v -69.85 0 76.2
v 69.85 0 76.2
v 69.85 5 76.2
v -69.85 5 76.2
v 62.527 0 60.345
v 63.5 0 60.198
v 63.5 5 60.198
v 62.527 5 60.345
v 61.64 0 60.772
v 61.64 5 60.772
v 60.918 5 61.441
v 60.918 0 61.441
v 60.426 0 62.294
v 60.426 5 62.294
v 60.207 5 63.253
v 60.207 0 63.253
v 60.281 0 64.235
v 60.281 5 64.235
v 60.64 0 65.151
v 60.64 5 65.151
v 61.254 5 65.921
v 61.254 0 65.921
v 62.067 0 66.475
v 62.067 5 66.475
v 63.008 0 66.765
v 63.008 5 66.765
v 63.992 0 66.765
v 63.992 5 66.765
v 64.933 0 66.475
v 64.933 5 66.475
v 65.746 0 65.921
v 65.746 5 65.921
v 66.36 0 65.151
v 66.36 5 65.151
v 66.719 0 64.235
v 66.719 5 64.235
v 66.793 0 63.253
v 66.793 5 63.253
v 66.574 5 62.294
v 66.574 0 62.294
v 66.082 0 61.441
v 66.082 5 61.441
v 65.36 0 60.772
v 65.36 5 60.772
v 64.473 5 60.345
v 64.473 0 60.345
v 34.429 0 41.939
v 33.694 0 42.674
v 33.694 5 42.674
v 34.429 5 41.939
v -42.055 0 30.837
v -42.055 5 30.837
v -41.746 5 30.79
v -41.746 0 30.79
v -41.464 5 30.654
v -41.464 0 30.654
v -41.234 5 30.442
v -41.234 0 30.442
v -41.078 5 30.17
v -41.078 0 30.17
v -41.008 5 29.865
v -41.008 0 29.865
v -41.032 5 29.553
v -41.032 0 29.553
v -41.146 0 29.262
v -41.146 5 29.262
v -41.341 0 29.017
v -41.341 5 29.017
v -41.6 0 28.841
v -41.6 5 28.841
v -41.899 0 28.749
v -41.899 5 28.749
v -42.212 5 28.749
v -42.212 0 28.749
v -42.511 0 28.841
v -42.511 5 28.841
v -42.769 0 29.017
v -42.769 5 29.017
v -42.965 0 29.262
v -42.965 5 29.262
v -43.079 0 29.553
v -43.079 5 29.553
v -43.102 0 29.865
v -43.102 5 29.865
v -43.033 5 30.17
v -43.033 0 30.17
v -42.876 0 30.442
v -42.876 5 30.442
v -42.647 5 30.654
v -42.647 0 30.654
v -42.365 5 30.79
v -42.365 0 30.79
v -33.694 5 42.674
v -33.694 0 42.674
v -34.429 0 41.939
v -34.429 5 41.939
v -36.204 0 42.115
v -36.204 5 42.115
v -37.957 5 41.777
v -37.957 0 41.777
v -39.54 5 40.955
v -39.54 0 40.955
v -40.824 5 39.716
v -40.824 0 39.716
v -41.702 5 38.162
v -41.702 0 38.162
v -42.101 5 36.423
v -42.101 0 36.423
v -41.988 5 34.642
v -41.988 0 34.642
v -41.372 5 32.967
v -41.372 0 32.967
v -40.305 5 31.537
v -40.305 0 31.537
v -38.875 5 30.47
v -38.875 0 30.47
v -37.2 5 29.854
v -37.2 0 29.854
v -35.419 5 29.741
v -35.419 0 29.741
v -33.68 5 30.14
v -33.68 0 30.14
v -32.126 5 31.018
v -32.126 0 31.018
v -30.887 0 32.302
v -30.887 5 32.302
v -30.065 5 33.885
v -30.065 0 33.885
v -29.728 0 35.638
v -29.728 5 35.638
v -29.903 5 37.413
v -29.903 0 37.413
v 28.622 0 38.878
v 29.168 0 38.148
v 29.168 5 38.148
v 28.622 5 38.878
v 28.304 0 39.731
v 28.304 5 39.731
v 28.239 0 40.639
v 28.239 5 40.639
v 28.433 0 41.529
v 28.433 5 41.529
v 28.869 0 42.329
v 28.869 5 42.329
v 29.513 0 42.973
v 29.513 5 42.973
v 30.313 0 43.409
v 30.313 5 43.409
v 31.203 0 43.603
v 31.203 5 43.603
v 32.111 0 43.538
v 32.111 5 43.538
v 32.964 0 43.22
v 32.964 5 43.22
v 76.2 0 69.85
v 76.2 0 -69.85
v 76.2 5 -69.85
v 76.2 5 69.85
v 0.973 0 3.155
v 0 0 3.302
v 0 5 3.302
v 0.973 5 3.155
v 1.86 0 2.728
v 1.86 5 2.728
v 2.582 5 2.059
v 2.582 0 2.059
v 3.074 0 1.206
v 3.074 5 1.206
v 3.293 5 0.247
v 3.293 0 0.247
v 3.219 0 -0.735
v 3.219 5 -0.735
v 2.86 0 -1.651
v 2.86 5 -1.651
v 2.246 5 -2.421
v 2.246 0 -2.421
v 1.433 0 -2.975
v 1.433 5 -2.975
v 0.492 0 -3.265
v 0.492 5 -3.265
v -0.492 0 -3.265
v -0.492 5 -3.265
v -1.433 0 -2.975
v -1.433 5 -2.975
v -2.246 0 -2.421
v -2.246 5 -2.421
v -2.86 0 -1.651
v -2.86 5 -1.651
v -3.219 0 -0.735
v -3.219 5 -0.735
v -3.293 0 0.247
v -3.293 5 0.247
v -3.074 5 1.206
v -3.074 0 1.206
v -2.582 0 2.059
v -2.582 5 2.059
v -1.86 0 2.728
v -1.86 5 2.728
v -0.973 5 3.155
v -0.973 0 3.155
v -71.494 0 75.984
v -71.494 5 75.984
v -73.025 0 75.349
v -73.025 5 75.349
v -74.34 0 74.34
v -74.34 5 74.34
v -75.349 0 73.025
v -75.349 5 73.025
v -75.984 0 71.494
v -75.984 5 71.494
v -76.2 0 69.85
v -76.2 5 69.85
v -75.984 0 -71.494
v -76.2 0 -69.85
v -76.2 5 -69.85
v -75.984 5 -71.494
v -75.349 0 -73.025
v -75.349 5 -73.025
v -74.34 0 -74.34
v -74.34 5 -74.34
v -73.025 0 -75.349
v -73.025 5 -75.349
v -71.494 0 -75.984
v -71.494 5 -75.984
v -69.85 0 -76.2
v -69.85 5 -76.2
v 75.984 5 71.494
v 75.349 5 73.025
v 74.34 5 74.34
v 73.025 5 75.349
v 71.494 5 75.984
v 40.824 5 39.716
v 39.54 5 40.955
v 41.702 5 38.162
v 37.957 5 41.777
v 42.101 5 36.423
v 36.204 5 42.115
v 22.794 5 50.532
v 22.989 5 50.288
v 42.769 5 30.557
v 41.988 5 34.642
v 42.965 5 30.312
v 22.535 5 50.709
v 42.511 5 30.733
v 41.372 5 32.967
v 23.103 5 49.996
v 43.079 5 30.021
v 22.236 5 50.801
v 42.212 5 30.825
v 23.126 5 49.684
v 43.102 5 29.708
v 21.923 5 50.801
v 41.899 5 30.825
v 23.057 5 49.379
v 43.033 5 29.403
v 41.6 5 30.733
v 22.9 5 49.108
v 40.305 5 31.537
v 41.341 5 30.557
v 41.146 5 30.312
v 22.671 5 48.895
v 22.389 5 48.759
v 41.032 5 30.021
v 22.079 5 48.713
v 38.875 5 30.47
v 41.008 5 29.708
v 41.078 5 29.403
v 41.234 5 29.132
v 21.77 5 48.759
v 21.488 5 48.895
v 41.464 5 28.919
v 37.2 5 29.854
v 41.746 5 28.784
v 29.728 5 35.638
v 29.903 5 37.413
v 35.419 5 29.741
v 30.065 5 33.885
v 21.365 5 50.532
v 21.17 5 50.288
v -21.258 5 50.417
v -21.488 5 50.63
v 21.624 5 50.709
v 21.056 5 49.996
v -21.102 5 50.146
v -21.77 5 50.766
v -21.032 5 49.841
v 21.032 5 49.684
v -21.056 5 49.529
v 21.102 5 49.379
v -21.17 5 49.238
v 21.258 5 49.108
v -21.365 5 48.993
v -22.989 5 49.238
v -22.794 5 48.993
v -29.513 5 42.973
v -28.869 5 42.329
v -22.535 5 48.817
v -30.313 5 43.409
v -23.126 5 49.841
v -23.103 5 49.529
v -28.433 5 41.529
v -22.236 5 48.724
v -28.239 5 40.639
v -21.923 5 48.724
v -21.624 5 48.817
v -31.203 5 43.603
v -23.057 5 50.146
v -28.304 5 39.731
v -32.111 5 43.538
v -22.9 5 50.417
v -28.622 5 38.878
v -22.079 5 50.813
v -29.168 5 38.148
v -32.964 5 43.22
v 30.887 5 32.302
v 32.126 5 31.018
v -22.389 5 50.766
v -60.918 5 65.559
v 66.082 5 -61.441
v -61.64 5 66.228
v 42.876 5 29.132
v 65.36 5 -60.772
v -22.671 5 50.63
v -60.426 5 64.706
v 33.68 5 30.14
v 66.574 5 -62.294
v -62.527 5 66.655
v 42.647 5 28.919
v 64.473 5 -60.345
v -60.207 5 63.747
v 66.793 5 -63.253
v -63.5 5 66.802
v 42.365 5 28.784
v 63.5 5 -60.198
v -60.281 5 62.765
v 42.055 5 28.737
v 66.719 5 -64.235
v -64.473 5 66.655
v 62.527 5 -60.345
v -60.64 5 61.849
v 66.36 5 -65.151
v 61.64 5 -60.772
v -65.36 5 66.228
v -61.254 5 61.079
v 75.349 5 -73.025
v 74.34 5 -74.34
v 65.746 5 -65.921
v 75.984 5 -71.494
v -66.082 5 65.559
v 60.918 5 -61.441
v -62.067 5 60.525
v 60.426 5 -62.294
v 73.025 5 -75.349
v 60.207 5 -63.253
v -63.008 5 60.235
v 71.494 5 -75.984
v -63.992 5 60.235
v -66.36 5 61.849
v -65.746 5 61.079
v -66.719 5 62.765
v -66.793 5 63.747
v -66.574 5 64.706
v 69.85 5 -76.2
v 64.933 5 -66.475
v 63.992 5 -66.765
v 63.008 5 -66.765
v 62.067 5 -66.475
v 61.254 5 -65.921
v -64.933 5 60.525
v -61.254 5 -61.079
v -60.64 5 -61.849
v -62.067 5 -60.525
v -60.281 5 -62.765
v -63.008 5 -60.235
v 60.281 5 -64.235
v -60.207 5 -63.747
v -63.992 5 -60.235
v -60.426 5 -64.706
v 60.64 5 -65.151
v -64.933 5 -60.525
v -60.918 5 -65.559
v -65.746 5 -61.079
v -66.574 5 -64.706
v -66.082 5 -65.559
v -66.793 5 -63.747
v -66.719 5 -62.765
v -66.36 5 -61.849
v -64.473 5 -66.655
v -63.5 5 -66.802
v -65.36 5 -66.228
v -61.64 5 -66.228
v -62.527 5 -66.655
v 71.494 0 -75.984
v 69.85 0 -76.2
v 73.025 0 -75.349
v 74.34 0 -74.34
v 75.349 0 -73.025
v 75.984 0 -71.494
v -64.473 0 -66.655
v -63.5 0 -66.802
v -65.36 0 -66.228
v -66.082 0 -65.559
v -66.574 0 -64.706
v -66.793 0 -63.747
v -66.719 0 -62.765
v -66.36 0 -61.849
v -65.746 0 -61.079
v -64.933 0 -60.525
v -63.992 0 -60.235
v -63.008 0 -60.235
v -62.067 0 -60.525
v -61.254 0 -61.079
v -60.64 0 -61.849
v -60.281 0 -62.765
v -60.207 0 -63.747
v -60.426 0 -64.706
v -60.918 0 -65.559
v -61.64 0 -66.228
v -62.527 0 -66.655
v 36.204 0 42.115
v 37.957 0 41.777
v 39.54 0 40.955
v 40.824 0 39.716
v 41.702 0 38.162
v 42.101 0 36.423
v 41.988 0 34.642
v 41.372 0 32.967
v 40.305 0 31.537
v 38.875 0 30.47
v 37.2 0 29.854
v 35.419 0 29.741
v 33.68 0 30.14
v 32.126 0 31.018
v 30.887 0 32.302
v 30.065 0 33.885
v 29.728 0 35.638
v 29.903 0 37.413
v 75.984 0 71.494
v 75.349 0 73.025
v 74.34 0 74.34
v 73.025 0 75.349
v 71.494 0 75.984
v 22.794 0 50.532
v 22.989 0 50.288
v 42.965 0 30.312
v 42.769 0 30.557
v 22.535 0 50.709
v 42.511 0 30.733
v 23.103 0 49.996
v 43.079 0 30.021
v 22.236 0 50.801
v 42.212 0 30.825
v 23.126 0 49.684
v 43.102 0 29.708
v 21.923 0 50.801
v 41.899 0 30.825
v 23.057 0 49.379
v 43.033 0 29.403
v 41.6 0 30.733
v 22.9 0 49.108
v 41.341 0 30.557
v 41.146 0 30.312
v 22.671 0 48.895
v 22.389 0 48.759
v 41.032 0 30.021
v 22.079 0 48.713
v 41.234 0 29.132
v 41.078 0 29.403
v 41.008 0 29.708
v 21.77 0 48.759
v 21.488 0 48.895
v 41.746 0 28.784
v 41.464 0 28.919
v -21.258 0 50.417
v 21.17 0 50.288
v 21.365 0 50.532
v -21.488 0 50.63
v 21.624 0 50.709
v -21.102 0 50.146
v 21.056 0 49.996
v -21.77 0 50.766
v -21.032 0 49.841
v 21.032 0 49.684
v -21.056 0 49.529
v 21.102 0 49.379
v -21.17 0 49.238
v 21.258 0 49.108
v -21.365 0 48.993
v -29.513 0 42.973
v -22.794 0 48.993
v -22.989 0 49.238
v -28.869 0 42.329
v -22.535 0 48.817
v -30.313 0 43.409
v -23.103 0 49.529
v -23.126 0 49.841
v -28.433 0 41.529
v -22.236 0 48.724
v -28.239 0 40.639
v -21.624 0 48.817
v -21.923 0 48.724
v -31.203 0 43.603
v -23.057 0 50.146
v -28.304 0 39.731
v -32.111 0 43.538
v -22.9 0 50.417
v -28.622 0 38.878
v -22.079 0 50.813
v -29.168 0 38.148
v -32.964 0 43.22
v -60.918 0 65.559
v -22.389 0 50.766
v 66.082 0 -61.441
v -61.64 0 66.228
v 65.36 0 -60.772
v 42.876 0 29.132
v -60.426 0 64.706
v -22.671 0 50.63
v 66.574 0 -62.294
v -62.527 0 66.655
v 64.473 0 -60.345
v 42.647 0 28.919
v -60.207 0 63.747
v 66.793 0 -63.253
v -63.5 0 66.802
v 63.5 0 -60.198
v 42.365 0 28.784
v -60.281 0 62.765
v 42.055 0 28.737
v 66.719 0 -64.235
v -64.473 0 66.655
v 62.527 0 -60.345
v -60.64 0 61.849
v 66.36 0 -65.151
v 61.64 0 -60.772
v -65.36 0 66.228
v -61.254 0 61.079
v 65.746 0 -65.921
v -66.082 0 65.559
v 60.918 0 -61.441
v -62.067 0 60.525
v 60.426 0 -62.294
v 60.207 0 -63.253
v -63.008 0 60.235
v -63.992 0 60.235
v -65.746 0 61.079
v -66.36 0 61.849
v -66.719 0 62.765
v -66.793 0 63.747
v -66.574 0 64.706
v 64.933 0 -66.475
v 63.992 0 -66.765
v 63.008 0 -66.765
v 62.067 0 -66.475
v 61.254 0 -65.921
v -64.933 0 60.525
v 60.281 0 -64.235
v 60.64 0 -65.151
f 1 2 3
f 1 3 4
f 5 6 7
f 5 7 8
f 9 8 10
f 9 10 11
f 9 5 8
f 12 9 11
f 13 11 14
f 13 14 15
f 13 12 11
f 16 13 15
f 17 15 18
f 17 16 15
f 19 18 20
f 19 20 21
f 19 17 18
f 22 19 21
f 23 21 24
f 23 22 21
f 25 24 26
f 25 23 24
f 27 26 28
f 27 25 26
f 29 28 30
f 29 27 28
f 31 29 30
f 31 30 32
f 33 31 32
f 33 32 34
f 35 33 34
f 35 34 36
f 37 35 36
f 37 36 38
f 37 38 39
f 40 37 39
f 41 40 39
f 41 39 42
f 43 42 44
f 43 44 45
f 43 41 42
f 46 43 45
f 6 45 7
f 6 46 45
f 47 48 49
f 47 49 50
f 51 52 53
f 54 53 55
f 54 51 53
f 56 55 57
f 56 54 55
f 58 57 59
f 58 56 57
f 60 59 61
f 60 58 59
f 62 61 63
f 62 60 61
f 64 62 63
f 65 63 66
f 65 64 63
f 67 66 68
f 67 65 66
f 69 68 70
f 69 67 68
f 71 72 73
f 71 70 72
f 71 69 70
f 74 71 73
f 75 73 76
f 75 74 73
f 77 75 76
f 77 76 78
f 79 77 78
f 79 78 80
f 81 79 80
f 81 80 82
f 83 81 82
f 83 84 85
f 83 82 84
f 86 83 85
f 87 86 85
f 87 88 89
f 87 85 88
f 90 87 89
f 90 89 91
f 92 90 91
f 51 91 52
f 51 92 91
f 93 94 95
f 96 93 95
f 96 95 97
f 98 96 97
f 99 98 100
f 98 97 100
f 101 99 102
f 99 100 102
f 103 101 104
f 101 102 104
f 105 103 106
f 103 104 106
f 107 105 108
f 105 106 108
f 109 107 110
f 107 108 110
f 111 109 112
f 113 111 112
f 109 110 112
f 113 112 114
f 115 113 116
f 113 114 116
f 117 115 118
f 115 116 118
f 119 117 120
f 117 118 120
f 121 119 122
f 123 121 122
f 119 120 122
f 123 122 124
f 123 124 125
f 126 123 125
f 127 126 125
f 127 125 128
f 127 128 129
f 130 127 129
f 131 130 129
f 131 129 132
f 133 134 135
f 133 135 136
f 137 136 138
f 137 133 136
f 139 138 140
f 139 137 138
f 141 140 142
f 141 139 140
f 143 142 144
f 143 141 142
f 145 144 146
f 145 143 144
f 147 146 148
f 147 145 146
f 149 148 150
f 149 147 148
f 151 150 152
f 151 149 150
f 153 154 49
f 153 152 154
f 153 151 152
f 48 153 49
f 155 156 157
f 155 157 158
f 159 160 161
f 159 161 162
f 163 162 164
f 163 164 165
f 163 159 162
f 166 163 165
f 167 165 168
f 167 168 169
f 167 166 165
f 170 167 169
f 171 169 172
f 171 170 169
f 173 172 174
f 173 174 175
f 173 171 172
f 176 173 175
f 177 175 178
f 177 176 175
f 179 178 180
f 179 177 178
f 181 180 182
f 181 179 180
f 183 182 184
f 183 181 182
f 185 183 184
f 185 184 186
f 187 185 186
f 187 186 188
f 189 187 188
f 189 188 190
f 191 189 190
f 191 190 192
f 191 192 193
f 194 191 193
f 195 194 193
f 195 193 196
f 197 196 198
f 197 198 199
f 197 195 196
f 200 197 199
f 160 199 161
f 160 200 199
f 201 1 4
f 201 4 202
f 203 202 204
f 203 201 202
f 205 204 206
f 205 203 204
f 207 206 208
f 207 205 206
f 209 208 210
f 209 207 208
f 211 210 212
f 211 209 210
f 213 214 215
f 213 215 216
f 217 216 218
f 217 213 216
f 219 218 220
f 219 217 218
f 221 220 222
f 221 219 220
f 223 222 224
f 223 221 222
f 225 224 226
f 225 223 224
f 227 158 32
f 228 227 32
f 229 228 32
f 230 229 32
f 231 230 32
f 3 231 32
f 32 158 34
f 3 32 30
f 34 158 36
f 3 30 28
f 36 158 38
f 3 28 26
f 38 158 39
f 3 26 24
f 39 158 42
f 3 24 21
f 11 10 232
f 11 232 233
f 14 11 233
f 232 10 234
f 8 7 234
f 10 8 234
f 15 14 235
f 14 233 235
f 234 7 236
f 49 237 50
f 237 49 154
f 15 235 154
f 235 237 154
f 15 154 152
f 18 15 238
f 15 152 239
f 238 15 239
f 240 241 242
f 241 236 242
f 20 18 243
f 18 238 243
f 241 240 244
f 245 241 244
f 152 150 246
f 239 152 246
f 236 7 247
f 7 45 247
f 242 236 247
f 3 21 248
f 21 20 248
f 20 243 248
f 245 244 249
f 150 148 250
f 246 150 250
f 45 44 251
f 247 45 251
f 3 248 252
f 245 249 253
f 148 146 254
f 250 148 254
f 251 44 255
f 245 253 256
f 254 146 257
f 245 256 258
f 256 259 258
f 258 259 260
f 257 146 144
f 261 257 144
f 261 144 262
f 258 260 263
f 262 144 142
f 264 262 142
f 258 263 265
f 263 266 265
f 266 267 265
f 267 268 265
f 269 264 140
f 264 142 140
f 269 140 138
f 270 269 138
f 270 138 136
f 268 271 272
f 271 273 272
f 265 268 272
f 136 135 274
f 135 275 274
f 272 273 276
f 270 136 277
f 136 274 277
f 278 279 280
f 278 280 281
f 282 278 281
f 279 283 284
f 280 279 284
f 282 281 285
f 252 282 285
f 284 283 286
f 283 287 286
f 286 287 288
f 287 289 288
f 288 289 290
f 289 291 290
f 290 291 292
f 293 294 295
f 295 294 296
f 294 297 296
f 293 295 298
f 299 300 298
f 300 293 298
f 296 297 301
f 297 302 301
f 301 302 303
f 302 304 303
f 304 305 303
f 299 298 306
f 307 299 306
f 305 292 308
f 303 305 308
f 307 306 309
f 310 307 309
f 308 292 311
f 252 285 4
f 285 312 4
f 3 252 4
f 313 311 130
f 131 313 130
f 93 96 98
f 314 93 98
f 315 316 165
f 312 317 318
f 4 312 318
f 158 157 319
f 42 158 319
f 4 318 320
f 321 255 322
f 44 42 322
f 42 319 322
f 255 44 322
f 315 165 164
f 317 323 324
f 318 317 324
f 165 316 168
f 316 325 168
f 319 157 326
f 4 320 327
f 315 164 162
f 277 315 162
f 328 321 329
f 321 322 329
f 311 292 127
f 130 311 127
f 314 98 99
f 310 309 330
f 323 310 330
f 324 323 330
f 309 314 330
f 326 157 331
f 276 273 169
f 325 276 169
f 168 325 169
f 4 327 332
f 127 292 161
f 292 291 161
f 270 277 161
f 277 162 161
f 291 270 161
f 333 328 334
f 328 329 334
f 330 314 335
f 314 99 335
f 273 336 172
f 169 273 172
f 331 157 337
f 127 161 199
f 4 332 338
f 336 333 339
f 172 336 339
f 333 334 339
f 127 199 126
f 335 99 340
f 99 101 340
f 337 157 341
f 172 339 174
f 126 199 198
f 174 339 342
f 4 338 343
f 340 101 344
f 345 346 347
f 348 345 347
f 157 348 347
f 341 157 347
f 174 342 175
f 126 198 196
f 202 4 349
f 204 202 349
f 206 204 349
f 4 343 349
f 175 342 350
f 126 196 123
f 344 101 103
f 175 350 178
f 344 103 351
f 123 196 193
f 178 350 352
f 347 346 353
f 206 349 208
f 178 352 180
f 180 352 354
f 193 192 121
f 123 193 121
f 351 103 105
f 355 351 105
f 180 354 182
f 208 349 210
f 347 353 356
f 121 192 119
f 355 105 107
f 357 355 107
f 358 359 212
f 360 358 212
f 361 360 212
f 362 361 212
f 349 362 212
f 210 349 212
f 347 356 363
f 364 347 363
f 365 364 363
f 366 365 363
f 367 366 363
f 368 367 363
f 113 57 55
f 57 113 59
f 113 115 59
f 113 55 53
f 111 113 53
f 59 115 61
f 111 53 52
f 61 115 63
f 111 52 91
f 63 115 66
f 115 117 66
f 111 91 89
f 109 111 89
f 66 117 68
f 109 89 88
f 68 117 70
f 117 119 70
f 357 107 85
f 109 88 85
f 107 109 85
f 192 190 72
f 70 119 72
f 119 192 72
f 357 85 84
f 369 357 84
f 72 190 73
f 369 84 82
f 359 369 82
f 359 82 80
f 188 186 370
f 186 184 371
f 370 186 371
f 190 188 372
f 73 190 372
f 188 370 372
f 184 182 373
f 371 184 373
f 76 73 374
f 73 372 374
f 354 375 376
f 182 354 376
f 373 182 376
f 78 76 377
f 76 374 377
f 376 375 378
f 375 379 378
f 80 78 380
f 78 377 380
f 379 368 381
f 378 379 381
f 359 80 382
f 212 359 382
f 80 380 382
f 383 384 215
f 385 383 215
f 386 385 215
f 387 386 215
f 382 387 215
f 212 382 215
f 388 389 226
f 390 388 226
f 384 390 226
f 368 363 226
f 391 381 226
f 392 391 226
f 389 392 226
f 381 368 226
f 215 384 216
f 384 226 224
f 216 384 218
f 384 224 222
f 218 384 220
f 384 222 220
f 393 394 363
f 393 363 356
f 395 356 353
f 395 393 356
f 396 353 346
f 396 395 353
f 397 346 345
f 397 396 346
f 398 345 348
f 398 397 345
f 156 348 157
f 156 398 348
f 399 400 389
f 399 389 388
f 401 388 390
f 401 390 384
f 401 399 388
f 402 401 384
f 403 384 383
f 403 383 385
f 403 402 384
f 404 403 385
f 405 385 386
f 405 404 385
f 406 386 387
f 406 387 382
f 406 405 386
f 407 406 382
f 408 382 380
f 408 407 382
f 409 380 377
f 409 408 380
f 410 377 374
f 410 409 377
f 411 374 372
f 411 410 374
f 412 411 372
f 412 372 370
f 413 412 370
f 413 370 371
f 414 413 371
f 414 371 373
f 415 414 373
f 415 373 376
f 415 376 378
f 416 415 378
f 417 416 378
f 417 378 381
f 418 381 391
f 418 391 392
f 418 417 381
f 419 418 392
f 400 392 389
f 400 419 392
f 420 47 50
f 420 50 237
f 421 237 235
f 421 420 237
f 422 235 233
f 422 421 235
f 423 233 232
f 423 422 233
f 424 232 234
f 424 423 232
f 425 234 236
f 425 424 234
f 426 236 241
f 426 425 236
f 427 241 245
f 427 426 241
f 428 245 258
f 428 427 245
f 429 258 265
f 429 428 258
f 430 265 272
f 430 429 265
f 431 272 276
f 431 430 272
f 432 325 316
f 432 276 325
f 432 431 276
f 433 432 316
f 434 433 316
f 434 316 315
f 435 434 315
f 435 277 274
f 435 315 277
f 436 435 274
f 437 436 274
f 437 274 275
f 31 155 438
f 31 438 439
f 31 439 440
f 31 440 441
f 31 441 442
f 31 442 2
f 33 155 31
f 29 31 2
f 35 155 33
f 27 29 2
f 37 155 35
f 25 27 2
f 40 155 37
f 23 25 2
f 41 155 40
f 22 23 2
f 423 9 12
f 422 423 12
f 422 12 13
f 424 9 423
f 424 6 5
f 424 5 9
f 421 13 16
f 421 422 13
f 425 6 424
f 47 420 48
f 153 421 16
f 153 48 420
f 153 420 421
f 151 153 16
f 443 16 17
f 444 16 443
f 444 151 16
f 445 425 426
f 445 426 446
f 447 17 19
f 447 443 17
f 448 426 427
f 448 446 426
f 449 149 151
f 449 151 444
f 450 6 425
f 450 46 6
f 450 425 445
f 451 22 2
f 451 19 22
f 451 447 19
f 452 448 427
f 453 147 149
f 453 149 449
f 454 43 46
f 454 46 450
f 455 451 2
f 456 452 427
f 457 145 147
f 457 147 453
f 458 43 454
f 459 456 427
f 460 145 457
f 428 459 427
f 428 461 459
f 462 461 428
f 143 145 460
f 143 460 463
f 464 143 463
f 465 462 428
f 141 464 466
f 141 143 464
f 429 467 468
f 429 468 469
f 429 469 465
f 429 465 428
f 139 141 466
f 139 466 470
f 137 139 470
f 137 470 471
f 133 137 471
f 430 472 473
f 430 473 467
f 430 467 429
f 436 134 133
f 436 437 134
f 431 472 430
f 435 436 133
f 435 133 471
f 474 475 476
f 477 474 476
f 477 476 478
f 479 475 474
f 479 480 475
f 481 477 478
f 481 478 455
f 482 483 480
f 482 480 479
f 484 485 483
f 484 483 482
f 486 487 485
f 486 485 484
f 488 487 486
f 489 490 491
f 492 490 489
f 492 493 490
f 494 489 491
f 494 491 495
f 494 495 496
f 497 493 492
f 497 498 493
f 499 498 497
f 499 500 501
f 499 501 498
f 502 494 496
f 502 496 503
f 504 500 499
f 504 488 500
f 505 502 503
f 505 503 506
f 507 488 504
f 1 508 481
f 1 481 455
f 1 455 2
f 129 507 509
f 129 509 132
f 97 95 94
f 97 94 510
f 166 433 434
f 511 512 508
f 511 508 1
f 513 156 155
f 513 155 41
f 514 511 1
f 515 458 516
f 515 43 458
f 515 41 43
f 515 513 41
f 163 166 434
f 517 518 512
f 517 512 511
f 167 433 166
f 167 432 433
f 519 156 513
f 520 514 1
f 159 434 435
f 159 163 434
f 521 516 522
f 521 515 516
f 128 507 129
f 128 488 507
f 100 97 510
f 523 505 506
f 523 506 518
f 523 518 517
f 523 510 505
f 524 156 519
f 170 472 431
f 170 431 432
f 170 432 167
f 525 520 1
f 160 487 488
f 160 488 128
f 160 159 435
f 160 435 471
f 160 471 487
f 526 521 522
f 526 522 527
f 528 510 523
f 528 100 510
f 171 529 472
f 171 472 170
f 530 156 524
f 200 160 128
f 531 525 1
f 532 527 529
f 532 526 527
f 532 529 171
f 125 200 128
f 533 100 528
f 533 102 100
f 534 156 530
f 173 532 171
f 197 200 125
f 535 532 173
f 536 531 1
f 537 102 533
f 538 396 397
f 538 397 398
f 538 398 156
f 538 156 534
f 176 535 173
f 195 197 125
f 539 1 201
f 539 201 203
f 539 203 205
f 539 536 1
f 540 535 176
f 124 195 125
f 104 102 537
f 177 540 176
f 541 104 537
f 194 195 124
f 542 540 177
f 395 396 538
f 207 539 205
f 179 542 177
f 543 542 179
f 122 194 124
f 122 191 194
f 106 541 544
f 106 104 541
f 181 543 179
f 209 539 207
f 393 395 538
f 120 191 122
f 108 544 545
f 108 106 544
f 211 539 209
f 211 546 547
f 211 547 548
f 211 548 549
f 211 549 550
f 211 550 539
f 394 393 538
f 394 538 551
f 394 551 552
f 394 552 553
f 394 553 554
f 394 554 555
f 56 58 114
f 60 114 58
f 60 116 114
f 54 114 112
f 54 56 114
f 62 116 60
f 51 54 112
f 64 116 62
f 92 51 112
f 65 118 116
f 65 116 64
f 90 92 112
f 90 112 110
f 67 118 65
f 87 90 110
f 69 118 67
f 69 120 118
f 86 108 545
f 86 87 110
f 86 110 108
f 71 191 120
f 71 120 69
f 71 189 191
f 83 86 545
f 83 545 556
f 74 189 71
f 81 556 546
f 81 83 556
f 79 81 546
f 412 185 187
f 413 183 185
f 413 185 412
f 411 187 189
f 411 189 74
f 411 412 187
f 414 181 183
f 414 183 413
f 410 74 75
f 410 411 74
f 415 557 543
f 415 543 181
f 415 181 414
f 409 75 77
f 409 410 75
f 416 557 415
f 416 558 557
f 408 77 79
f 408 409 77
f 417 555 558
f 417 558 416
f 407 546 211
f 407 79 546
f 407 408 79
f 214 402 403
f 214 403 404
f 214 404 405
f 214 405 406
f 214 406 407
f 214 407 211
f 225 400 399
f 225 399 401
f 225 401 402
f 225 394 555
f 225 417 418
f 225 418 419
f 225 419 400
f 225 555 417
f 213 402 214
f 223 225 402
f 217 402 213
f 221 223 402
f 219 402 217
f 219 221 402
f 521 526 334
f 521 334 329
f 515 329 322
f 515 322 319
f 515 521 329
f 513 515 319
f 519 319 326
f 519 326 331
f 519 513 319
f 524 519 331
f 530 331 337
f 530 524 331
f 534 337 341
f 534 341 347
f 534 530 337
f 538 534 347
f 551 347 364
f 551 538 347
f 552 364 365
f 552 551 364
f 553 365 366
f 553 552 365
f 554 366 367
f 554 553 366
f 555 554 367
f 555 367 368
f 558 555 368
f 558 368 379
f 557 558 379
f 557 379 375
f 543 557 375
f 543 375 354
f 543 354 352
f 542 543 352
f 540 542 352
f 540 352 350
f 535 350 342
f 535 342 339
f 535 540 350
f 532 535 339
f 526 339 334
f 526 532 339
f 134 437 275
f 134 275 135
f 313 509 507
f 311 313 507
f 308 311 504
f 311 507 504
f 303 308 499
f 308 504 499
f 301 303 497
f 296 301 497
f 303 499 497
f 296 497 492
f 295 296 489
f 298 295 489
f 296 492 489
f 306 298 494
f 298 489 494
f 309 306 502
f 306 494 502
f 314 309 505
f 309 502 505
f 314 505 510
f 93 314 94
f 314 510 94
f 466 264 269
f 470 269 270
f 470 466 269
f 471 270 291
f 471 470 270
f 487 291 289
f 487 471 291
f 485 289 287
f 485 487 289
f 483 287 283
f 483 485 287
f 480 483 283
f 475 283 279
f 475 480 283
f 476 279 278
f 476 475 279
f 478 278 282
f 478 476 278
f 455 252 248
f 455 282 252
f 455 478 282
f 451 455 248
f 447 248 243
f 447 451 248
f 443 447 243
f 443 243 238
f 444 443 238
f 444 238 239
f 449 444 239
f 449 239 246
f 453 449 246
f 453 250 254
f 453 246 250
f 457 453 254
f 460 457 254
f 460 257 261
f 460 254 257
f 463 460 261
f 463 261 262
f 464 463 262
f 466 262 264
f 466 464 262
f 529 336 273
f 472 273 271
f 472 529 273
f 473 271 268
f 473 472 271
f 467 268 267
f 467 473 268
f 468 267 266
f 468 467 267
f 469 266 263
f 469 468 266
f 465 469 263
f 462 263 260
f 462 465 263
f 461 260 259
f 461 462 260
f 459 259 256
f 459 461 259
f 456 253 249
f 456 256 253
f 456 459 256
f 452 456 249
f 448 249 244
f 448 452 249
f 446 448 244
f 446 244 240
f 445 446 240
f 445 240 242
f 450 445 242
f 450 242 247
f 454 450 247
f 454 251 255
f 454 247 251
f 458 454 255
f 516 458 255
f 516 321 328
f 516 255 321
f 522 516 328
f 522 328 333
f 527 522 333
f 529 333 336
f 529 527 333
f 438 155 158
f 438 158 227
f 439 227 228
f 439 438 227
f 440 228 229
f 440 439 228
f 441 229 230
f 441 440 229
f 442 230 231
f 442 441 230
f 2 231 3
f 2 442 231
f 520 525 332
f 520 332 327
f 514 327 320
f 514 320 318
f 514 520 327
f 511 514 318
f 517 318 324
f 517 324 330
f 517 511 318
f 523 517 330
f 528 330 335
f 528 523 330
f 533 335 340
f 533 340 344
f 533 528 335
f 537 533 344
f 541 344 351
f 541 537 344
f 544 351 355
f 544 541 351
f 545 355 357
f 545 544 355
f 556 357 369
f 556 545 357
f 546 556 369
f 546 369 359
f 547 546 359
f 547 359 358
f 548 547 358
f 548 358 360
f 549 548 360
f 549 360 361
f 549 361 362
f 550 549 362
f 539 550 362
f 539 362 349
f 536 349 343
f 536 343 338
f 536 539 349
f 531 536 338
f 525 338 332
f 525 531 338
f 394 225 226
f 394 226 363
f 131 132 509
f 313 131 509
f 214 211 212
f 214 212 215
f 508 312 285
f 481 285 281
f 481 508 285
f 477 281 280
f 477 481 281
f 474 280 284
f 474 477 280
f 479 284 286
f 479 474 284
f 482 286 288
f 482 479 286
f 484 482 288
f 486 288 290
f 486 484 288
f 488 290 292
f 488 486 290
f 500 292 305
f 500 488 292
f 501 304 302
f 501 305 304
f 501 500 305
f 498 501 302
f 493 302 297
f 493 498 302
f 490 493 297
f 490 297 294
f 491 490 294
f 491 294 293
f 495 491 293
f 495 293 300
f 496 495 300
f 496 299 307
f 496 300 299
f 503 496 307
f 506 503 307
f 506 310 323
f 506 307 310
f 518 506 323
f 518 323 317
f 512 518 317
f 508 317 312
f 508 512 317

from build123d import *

# Parameters (mm, degrees)
SKETCH1_R           = 3.302
BOSS_EXTRUDE1_DEPTH = 5
SKETCH2_R           = 1.05
CUT_EXTRUDE2_DEPTH  = 108.879006299


with BuildPart() as part:
    # Sketch1 → Boss-Extrude1 (new body)
    with BuildSketch(Plane(origin=(0, 0, 0), x_dir=(1, 0, 0), z_dir=(0, 1, 0))):
        with BuildLine():
            Line((-69.85, 76.2), (69.85, 76.2))
            ThreePointArc((69.85, 76.2), (74.340128061, 74.340128061), (76.2, 69.85))
            Line((76.2, 69.85), (76.2, -69.85))
            ThreePointArc((76.2, -69.85), (74.340128061, -74.340128061), (69.85, -76.2))
            Line((69.85, -76.2), (-69.85, -76.2))
            ThreePointArc((-69.85, -76.2), (-74.340128061, -74.340128061), (-76.2, -69.85))
            Line((-76.2, -69.85), (-76.2, 69.85))
            ThreePointArc((-76.2, 69.85), (-74.340128061, 74.340128061), (-69.85, 76.2))
        make_face()
        with Locations(Location((63.5, 63.5, 0), (0, 0, 270))):
            Circle(SKETCH1_R, mode=Mode.SUBTRACT)
        with Locations(Location((63.5, -63.5, 0), (0, 0, 90))):
            Circle(SKETCH1_R, mode=Mode.SUBTRACT)
        with Locations(Location((-63.5, -63.5, 0), (0, 0, 270))):
            Circle(SKETCH1_R, mode=Mode.SUBTRACT)
        with Locations(Location((-63.5, 63.5, 0), (0, 0, 90))):
            Circle(SKETCH1_R, mode=Mode.SUBTRACT)
        with Locations(Location((0, 0, 0), (0, 0, 270))):
            Circle(SKETCH1_R, mode=Mode.SUBTRACT)
    extrude(amount=BOSS_EXTRUDE1_DEPTH)

    # Sketch2 → Cut-Extrude2 (cut, through all)
    with BuildSketch(Plane(origin=(0, 0, 0), x_dir=(1, 0, 0), z_dir=(0, 1, 0))):
        with Locations(Location((-42.055175811, -29.786873157, 0), (0, 0, 270))):
            Circle(SKETCH2_R)
        with Locations(Location((-22.079409243, -49.762639726, 0), (0, 0, 270))):
            Circle(SKETCH2_R)
        with Locations(Location((22.079409243, -49.762639726, 0), (0, 0, 90))):
            Circle(SKETCH2_R)
        with Locations(Location((42.055175811, -29.786873157, 0), (0, 0, 90))):
            Circle(SKETCH2_R)
        with BuildLine():
            Line((-33.693638124, -42.673894245), (-34.428769513, -41.938762855))
            ThreePointArc((-34.428769513, -41.938762855), (-40.305086528, -31.536962441), (-29.903286113, -37.413279456))
            Line((-29.903286113, -37.413279456), (-29.168154724, -38.148410845))
            ThreePointArc((-29.168154724, -38.148410845), (-29.168154724, -42.673894245), (-33.693638124, -42.673894245))
        make_face()
        with BuildLine():
            Line((33.693638124, -42.673894245), (34.428769513, -41.938762855))
            ThreePointArc((34.428769513, -41.938762855), (40.305086528, -31.536962441), (29.903286113, -37.413279456))
            Line((29.903286113, -37.413279456), (29.168154724, -38.148410845))
            ThreePointArc((29.168154724, -38.148410845), (29.168154724, -42.673894245), (33.693638124, -42.673894245))
        make_face()
    extrude(amount=CUT_EXTRUDE2_DEPTH, mode=Mode.SUBTRACT)


solid = part.part
